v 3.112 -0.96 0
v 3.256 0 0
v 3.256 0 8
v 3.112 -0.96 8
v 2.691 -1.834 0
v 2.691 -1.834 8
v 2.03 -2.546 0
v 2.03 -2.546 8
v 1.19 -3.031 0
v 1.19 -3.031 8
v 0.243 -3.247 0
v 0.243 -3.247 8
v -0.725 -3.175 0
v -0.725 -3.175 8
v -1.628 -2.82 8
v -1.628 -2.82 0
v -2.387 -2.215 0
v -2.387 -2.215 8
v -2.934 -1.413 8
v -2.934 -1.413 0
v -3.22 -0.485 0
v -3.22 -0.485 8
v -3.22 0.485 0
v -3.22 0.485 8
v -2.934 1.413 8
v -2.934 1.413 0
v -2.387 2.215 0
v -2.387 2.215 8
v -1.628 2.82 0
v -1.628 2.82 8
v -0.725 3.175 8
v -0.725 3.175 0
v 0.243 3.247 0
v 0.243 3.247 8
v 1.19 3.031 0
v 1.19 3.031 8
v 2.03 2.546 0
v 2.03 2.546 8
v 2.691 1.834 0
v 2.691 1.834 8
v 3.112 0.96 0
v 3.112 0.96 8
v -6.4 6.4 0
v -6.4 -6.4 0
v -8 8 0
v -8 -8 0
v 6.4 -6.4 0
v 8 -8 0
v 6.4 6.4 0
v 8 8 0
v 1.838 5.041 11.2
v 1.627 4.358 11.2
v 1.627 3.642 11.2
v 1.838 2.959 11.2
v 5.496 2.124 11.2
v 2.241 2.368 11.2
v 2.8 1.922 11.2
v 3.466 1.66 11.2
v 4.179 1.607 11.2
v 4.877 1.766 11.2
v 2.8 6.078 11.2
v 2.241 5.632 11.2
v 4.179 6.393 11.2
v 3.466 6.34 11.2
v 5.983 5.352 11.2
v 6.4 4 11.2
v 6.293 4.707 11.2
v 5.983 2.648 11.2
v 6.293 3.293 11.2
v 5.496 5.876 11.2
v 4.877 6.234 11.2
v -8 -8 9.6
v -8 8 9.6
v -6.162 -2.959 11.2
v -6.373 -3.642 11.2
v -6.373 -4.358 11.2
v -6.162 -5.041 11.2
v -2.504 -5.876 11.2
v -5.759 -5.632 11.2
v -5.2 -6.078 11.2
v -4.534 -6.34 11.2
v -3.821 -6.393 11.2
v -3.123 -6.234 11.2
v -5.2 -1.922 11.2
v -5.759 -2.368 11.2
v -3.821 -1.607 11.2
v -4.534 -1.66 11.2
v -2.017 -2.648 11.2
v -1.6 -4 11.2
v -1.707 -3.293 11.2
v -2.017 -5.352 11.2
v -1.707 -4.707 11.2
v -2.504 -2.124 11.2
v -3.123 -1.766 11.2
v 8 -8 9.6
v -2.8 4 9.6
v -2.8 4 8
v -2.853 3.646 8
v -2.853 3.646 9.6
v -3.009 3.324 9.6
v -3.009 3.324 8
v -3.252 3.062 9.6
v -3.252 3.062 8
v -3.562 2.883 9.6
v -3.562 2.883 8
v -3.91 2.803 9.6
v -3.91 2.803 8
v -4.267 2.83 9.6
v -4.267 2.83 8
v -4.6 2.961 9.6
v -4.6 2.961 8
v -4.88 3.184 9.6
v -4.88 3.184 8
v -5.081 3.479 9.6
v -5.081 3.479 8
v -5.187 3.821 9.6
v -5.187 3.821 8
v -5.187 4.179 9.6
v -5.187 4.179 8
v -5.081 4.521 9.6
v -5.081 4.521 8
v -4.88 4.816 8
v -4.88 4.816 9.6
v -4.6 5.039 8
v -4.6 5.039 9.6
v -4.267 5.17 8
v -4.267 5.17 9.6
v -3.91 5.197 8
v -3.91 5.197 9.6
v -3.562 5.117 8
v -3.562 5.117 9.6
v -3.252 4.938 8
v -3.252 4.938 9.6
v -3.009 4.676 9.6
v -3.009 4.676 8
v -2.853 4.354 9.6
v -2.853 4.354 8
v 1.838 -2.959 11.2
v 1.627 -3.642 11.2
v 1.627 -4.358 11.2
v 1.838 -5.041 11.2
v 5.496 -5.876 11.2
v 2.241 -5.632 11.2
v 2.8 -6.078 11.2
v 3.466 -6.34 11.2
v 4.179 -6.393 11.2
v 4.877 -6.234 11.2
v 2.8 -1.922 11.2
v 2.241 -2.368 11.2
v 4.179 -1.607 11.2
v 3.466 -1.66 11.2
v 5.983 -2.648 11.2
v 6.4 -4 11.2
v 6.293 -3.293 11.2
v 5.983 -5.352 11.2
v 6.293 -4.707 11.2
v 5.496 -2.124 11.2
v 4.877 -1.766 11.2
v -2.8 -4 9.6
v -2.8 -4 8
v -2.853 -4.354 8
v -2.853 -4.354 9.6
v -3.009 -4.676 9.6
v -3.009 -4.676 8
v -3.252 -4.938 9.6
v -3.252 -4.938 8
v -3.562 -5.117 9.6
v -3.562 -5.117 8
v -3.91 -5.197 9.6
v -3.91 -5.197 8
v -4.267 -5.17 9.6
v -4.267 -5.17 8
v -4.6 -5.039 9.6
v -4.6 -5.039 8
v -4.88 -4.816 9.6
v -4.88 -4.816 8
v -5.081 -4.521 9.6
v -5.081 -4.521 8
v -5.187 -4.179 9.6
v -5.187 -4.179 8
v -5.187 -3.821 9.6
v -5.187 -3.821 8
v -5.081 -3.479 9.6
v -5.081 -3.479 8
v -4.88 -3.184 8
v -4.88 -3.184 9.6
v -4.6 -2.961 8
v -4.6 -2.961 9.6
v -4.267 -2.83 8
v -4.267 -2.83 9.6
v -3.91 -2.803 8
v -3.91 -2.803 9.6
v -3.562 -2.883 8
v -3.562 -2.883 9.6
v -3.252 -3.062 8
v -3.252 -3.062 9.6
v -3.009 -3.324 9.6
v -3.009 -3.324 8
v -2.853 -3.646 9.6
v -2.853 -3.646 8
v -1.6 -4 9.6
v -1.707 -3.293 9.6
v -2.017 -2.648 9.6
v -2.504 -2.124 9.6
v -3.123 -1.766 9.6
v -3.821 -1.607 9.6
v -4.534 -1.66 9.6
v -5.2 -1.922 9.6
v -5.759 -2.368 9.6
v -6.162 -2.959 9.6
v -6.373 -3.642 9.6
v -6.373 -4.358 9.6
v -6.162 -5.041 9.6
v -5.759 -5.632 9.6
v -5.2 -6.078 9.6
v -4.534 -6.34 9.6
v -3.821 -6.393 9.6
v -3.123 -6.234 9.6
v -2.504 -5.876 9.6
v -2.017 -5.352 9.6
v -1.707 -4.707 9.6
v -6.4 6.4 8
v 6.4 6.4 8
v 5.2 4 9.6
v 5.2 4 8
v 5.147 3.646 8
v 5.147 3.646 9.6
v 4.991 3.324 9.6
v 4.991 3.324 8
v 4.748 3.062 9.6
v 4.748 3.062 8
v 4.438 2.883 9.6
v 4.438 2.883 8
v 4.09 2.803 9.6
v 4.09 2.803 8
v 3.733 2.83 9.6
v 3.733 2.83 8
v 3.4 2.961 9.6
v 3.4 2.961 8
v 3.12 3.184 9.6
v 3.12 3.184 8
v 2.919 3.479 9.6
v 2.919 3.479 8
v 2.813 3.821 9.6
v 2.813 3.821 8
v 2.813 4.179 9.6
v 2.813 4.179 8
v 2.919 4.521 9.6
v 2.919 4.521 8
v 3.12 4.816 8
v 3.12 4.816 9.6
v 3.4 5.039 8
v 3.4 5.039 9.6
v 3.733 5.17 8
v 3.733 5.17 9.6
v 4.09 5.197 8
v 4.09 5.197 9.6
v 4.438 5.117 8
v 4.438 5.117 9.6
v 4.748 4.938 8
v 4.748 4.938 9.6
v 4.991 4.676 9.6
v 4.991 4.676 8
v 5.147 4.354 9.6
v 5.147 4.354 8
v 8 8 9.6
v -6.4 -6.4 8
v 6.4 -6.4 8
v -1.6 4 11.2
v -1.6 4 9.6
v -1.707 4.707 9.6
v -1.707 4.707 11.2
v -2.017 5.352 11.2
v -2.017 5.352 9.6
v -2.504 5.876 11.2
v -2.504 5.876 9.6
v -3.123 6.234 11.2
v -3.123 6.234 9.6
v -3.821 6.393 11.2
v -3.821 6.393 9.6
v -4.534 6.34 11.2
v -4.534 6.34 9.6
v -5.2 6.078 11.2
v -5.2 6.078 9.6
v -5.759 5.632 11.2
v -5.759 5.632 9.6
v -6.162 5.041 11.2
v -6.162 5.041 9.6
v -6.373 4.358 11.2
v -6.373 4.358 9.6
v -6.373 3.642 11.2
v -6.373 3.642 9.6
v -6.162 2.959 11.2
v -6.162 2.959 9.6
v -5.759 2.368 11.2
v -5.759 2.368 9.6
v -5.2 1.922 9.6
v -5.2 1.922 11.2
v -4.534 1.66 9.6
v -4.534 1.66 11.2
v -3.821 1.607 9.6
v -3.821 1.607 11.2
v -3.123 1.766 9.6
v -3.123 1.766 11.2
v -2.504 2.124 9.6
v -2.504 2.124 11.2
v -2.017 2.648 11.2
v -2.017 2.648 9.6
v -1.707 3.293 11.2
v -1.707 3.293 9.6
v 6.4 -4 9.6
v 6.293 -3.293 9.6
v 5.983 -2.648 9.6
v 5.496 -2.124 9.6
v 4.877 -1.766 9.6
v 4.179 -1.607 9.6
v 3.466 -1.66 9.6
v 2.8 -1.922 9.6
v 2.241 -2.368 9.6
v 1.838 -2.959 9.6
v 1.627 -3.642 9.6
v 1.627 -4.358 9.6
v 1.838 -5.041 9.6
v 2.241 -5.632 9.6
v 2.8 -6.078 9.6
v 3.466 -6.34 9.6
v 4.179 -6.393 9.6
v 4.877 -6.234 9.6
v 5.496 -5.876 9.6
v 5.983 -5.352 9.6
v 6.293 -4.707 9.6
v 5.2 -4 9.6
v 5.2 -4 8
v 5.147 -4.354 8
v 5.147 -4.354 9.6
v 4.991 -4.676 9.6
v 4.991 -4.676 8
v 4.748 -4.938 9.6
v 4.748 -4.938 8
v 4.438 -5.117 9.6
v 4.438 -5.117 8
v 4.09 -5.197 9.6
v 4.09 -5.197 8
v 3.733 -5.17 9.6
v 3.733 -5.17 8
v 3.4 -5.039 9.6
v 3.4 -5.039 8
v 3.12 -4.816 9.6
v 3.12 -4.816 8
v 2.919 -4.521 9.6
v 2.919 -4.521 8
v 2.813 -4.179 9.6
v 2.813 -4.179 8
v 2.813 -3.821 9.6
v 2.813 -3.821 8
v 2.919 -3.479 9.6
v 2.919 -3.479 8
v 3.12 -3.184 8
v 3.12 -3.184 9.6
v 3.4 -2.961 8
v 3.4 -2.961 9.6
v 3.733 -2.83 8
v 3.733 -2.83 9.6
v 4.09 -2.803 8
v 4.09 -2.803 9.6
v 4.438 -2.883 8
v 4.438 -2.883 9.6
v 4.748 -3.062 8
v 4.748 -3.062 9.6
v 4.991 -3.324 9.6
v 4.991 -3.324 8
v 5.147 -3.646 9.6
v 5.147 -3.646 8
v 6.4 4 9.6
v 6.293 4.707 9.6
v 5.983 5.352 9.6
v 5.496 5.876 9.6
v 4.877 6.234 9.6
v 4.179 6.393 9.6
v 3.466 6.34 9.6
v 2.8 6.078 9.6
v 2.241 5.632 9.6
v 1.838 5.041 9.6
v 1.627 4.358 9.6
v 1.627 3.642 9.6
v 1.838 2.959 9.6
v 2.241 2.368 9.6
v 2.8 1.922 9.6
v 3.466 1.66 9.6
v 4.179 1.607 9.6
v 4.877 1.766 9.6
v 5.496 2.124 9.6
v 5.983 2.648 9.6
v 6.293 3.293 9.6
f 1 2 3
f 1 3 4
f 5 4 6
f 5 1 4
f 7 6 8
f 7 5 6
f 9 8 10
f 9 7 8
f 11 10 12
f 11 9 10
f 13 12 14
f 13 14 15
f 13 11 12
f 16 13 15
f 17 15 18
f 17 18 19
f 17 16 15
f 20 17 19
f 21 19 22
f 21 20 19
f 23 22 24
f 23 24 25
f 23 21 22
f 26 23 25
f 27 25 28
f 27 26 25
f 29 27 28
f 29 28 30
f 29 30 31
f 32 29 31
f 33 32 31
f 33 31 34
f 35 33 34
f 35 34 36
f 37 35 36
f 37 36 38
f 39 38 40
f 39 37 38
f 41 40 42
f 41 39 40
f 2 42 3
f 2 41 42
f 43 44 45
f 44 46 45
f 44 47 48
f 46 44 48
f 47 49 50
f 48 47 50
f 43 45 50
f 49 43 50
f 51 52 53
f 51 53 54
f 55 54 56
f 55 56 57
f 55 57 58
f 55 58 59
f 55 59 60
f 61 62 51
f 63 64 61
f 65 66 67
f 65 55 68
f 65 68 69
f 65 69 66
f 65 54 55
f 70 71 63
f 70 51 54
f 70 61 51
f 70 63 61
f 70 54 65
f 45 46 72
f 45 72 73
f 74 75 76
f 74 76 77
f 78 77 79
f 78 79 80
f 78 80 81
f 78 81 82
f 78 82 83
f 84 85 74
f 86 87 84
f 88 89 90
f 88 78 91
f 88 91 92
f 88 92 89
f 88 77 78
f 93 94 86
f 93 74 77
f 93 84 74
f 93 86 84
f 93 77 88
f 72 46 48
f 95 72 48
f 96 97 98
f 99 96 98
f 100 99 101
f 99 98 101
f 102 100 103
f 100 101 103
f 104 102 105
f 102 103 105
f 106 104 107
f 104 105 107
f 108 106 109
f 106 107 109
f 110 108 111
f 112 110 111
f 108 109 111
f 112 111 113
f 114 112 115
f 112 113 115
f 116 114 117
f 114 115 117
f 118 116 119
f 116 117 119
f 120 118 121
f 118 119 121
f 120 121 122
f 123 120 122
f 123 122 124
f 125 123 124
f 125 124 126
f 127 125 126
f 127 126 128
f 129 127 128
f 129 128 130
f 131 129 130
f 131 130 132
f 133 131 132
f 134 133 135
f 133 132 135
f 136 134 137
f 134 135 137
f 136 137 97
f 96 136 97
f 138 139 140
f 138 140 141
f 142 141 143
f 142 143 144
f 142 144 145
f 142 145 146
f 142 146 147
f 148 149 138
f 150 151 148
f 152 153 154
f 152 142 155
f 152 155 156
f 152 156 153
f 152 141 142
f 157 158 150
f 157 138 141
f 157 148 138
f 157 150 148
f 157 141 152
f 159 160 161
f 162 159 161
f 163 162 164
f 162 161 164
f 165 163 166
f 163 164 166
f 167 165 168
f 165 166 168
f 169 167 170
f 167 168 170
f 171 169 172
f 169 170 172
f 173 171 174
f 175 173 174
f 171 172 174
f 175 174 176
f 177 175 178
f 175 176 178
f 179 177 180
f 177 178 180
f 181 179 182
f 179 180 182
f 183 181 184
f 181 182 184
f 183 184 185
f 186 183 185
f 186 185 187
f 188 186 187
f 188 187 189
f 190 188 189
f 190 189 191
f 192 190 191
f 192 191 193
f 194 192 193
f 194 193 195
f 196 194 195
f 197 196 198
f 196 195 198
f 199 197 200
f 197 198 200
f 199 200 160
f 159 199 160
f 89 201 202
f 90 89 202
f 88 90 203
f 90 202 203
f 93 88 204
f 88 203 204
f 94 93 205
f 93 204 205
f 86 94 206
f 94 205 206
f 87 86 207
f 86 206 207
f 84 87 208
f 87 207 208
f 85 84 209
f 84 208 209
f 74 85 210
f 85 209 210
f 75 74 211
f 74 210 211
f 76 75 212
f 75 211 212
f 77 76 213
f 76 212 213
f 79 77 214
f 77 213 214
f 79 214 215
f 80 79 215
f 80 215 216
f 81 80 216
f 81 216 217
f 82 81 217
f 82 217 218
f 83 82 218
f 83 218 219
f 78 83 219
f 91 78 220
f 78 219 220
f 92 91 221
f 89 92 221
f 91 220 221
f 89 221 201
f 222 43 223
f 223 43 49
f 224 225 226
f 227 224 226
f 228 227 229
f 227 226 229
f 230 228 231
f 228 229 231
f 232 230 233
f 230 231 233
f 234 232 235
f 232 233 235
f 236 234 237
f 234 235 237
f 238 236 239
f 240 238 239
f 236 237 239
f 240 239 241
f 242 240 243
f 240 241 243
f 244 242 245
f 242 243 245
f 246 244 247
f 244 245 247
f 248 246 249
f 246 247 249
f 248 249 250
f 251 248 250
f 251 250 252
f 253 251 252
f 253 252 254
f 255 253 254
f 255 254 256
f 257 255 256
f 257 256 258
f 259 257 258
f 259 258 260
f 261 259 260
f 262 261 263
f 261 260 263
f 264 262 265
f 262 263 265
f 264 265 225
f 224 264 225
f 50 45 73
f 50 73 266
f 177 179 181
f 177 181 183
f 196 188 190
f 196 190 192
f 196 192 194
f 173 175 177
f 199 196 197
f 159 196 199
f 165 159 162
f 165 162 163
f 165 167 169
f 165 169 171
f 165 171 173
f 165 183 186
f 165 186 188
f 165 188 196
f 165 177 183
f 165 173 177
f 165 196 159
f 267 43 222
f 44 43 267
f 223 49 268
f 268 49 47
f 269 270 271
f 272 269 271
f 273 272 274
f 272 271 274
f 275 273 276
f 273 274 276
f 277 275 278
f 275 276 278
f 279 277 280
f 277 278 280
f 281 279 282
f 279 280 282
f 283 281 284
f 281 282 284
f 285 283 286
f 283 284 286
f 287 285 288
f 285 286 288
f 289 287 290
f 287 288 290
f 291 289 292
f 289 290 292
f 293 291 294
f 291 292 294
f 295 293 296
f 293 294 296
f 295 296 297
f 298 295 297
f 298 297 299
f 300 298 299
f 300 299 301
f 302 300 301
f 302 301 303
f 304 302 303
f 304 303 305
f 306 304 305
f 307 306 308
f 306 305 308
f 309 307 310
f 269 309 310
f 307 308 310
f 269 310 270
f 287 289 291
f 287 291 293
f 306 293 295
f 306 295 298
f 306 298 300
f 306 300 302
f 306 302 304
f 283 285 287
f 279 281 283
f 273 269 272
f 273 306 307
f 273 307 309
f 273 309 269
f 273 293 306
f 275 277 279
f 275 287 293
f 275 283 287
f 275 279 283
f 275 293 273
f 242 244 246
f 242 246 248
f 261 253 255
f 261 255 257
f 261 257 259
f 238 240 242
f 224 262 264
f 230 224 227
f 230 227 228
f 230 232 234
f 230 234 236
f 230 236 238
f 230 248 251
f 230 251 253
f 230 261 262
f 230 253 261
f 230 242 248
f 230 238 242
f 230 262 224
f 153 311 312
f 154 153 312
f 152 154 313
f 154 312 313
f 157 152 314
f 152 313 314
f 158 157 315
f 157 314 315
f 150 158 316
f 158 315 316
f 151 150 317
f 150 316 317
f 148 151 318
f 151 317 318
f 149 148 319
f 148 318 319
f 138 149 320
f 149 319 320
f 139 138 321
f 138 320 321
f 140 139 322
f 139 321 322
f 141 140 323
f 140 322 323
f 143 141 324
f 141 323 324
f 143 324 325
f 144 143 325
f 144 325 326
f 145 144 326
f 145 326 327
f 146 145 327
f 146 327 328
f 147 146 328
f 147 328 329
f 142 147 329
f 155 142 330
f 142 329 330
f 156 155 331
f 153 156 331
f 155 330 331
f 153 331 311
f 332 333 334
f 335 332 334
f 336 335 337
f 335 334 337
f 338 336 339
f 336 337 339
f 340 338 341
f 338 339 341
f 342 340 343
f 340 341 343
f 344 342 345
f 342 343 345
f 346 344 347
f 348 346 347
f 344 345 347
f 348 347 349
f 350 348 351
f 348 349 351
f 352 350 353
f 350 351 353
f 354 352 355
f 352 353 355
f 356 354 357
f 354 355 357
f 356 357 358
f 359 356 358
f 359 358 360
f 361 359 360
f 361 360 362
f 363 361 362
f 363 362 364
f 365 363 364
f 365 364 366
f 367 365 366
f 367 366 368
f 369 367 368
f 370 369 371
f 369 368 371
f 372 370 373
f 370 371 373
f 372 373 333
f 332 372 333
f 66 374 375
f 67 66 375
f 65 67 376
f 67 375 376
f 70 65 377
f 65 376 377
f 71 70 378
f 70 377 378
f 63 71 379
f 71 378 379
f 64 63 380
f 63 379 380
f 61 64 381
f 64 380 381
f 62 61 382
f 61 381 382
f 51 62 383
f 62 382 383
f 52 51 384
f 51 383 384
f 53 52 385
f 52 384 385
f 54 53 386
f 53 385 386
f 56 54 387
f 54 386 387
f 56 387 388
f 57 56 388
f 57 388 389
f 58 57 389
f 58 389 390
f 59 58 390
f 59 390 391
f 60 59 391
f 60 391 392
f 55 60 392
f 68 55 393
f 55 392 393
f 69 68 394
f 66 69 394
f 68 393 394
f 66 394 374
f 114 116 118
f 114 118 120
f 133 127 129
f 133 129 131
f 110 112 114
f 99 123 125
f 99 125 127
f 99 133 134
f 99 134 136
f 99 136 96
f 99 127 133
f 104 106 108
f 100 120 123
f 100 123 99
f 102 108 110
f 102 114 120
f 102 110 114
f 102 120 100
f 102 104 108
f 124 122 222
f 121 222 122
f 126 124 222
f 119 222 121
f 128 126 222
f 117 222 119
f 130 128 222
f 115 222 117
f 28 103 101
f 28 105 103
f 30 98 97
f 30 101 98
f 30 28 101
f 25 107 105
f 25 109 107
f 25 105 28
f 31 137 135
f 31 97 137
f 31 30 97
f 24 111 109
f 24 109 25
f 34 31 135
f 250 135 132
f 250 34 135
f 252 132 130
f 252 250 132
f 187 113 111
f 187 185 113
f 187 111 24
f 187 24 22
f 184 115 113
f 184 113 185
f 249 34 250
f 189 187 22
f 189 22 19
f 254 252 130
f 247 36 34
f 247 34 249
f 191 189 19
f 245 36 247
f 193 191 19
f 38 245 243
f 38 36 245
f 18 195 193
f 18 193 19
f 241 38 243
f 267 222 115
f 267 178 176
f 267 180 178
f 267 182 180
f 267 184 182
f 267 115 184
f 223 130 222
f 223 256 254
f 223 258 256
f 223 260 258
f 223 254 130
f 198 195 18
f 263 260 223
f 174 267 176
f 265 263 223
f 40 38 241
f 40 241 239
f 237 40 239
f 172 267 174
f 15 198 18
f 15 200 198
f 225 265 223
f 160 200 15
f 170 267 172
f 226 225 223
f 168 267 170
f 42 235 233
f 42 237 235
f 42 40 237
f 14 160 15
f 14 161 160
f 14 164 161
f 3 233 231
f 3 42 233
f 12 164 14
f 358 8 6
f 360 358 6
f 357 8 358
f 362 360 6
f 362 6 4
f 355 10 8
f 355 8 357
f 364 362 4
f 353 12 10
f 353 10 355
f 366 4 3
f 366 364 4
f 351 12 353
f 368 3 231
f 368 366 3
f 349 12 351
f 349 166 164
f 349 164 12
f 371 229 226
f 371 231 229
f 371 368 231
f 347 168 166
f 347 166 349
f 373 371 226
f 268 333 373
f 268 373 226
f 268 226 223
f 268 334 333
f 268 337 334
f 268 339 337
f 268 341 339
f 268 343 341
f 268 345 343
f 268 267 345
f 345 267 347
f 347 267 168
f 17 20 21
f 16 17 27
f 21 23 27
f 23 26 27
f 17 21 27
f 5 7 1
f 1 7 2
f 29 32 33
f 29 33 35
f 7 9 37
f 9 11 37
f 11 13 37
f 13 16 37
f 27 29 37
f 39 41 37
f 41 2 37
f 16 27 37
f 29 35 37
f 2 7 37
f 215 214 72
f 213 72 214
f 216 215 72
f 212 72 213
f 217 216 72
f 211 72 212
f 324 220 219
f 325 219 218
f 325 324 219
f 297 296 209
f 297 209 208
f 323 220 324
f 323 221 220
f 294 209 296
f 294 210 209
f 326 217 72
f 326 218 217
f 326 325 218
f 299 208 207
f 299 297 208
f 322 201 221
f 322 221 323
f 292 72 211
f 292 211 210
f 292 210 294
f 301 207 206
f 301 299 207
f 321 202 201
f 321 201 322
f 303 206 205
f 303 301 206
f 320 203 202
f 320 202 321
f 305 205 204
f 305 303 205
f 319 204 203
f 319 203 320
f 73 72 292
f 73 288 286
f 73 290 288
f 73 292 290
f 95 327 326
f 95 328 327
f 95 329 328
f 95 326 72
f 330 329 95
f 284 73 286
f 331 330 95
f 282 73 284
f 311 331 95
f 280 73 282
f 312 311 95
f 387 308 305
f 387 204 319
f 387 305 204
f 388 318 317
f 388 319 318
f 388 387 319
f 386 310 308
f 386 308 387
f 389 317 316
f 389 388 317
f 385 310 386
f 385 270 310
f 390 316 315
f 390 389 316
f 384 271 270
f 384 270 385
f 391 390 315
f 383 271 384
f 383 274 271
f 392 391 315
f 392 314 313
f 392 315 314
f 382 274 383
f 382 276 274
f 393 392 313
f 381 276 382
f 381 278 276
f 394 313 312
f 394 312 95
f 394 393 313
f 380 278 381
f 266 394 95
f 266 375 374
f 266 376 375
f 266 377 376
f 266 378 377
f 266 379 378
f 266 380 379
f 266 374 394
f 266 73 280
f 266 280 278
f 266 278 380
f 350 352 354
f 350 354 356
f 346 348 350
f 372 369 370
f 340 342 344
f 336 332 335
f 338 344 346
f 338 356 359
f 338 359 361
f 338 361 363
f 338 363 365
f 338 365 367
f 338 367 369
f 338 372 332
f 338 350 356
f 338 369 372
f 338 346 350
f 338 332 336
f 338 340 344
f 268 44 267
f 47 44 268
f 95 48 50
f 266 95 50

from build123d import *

# Parameters (mm, degrees)
F0_W     = 16
F0_H     = 16
F1_DEPTH = 9.6
F2_W     = 12.8
F2_H     = 12.8
F2_R     = 3.2565
F3_DEPTH = 8
F4_R     = 2.4
F5_DEPTH = 1.6
F6_R     = 1.2
F7_DEPTH = 1.6


with BuildPart() as f1:
    # F0 (on Top) → F1 (new body)
    with BuildSketch(Plane.XY):
        Rectangle(F0_W, F0_H)
    extrude(amount=F1_DEPTH)

    # F2 (on face) → F3 (cut)
    with BuildSketch(Plane(origin=(0, 0, 0), x_dir=(1, 0, 0), z_dir=(0, 0, -1))):
        Rectangle(F2_W, F2_H)
        Circle(F2_R, mode=Mode.SUBTRACT)
    extrude(amount=-F3_DEPTH, mode=Mode.SUBTRACT)

    # F4 (on face) → F5 (join)
    with BuildSketch(Plane.XY.offset(9.6)):
        with Locations((-4, 4)):
            Circle(F4_R)
        with Locations((4, 4)):
            Circle(F4_R)
        with Locations((-4, -4)):
            Circle(F4_R)
        with Locations((4, -4)):
            Circle(F4_R)
    extrude(amount=F5_DEPTH)

    # F6 (on face) → F7 (cut)
    with BuildSketch(Plane(origin=(0, 0, 8), x_dir=(1, 0, 0), z_dir=(0, 0, -1))):
        with Locations((-4, -4)):
            Circle(F6_R)
        with Locations((4, -4)):
            Circle(F6_R)
        with Locations((-4, 4)):
            Circle(F6_R)
        with Locations((4, 4)):
            Circle(F6_R)
    extrude(amount=-F7_DEPTH, mode=Mode.SUBTRACT)


solid = f1.part
